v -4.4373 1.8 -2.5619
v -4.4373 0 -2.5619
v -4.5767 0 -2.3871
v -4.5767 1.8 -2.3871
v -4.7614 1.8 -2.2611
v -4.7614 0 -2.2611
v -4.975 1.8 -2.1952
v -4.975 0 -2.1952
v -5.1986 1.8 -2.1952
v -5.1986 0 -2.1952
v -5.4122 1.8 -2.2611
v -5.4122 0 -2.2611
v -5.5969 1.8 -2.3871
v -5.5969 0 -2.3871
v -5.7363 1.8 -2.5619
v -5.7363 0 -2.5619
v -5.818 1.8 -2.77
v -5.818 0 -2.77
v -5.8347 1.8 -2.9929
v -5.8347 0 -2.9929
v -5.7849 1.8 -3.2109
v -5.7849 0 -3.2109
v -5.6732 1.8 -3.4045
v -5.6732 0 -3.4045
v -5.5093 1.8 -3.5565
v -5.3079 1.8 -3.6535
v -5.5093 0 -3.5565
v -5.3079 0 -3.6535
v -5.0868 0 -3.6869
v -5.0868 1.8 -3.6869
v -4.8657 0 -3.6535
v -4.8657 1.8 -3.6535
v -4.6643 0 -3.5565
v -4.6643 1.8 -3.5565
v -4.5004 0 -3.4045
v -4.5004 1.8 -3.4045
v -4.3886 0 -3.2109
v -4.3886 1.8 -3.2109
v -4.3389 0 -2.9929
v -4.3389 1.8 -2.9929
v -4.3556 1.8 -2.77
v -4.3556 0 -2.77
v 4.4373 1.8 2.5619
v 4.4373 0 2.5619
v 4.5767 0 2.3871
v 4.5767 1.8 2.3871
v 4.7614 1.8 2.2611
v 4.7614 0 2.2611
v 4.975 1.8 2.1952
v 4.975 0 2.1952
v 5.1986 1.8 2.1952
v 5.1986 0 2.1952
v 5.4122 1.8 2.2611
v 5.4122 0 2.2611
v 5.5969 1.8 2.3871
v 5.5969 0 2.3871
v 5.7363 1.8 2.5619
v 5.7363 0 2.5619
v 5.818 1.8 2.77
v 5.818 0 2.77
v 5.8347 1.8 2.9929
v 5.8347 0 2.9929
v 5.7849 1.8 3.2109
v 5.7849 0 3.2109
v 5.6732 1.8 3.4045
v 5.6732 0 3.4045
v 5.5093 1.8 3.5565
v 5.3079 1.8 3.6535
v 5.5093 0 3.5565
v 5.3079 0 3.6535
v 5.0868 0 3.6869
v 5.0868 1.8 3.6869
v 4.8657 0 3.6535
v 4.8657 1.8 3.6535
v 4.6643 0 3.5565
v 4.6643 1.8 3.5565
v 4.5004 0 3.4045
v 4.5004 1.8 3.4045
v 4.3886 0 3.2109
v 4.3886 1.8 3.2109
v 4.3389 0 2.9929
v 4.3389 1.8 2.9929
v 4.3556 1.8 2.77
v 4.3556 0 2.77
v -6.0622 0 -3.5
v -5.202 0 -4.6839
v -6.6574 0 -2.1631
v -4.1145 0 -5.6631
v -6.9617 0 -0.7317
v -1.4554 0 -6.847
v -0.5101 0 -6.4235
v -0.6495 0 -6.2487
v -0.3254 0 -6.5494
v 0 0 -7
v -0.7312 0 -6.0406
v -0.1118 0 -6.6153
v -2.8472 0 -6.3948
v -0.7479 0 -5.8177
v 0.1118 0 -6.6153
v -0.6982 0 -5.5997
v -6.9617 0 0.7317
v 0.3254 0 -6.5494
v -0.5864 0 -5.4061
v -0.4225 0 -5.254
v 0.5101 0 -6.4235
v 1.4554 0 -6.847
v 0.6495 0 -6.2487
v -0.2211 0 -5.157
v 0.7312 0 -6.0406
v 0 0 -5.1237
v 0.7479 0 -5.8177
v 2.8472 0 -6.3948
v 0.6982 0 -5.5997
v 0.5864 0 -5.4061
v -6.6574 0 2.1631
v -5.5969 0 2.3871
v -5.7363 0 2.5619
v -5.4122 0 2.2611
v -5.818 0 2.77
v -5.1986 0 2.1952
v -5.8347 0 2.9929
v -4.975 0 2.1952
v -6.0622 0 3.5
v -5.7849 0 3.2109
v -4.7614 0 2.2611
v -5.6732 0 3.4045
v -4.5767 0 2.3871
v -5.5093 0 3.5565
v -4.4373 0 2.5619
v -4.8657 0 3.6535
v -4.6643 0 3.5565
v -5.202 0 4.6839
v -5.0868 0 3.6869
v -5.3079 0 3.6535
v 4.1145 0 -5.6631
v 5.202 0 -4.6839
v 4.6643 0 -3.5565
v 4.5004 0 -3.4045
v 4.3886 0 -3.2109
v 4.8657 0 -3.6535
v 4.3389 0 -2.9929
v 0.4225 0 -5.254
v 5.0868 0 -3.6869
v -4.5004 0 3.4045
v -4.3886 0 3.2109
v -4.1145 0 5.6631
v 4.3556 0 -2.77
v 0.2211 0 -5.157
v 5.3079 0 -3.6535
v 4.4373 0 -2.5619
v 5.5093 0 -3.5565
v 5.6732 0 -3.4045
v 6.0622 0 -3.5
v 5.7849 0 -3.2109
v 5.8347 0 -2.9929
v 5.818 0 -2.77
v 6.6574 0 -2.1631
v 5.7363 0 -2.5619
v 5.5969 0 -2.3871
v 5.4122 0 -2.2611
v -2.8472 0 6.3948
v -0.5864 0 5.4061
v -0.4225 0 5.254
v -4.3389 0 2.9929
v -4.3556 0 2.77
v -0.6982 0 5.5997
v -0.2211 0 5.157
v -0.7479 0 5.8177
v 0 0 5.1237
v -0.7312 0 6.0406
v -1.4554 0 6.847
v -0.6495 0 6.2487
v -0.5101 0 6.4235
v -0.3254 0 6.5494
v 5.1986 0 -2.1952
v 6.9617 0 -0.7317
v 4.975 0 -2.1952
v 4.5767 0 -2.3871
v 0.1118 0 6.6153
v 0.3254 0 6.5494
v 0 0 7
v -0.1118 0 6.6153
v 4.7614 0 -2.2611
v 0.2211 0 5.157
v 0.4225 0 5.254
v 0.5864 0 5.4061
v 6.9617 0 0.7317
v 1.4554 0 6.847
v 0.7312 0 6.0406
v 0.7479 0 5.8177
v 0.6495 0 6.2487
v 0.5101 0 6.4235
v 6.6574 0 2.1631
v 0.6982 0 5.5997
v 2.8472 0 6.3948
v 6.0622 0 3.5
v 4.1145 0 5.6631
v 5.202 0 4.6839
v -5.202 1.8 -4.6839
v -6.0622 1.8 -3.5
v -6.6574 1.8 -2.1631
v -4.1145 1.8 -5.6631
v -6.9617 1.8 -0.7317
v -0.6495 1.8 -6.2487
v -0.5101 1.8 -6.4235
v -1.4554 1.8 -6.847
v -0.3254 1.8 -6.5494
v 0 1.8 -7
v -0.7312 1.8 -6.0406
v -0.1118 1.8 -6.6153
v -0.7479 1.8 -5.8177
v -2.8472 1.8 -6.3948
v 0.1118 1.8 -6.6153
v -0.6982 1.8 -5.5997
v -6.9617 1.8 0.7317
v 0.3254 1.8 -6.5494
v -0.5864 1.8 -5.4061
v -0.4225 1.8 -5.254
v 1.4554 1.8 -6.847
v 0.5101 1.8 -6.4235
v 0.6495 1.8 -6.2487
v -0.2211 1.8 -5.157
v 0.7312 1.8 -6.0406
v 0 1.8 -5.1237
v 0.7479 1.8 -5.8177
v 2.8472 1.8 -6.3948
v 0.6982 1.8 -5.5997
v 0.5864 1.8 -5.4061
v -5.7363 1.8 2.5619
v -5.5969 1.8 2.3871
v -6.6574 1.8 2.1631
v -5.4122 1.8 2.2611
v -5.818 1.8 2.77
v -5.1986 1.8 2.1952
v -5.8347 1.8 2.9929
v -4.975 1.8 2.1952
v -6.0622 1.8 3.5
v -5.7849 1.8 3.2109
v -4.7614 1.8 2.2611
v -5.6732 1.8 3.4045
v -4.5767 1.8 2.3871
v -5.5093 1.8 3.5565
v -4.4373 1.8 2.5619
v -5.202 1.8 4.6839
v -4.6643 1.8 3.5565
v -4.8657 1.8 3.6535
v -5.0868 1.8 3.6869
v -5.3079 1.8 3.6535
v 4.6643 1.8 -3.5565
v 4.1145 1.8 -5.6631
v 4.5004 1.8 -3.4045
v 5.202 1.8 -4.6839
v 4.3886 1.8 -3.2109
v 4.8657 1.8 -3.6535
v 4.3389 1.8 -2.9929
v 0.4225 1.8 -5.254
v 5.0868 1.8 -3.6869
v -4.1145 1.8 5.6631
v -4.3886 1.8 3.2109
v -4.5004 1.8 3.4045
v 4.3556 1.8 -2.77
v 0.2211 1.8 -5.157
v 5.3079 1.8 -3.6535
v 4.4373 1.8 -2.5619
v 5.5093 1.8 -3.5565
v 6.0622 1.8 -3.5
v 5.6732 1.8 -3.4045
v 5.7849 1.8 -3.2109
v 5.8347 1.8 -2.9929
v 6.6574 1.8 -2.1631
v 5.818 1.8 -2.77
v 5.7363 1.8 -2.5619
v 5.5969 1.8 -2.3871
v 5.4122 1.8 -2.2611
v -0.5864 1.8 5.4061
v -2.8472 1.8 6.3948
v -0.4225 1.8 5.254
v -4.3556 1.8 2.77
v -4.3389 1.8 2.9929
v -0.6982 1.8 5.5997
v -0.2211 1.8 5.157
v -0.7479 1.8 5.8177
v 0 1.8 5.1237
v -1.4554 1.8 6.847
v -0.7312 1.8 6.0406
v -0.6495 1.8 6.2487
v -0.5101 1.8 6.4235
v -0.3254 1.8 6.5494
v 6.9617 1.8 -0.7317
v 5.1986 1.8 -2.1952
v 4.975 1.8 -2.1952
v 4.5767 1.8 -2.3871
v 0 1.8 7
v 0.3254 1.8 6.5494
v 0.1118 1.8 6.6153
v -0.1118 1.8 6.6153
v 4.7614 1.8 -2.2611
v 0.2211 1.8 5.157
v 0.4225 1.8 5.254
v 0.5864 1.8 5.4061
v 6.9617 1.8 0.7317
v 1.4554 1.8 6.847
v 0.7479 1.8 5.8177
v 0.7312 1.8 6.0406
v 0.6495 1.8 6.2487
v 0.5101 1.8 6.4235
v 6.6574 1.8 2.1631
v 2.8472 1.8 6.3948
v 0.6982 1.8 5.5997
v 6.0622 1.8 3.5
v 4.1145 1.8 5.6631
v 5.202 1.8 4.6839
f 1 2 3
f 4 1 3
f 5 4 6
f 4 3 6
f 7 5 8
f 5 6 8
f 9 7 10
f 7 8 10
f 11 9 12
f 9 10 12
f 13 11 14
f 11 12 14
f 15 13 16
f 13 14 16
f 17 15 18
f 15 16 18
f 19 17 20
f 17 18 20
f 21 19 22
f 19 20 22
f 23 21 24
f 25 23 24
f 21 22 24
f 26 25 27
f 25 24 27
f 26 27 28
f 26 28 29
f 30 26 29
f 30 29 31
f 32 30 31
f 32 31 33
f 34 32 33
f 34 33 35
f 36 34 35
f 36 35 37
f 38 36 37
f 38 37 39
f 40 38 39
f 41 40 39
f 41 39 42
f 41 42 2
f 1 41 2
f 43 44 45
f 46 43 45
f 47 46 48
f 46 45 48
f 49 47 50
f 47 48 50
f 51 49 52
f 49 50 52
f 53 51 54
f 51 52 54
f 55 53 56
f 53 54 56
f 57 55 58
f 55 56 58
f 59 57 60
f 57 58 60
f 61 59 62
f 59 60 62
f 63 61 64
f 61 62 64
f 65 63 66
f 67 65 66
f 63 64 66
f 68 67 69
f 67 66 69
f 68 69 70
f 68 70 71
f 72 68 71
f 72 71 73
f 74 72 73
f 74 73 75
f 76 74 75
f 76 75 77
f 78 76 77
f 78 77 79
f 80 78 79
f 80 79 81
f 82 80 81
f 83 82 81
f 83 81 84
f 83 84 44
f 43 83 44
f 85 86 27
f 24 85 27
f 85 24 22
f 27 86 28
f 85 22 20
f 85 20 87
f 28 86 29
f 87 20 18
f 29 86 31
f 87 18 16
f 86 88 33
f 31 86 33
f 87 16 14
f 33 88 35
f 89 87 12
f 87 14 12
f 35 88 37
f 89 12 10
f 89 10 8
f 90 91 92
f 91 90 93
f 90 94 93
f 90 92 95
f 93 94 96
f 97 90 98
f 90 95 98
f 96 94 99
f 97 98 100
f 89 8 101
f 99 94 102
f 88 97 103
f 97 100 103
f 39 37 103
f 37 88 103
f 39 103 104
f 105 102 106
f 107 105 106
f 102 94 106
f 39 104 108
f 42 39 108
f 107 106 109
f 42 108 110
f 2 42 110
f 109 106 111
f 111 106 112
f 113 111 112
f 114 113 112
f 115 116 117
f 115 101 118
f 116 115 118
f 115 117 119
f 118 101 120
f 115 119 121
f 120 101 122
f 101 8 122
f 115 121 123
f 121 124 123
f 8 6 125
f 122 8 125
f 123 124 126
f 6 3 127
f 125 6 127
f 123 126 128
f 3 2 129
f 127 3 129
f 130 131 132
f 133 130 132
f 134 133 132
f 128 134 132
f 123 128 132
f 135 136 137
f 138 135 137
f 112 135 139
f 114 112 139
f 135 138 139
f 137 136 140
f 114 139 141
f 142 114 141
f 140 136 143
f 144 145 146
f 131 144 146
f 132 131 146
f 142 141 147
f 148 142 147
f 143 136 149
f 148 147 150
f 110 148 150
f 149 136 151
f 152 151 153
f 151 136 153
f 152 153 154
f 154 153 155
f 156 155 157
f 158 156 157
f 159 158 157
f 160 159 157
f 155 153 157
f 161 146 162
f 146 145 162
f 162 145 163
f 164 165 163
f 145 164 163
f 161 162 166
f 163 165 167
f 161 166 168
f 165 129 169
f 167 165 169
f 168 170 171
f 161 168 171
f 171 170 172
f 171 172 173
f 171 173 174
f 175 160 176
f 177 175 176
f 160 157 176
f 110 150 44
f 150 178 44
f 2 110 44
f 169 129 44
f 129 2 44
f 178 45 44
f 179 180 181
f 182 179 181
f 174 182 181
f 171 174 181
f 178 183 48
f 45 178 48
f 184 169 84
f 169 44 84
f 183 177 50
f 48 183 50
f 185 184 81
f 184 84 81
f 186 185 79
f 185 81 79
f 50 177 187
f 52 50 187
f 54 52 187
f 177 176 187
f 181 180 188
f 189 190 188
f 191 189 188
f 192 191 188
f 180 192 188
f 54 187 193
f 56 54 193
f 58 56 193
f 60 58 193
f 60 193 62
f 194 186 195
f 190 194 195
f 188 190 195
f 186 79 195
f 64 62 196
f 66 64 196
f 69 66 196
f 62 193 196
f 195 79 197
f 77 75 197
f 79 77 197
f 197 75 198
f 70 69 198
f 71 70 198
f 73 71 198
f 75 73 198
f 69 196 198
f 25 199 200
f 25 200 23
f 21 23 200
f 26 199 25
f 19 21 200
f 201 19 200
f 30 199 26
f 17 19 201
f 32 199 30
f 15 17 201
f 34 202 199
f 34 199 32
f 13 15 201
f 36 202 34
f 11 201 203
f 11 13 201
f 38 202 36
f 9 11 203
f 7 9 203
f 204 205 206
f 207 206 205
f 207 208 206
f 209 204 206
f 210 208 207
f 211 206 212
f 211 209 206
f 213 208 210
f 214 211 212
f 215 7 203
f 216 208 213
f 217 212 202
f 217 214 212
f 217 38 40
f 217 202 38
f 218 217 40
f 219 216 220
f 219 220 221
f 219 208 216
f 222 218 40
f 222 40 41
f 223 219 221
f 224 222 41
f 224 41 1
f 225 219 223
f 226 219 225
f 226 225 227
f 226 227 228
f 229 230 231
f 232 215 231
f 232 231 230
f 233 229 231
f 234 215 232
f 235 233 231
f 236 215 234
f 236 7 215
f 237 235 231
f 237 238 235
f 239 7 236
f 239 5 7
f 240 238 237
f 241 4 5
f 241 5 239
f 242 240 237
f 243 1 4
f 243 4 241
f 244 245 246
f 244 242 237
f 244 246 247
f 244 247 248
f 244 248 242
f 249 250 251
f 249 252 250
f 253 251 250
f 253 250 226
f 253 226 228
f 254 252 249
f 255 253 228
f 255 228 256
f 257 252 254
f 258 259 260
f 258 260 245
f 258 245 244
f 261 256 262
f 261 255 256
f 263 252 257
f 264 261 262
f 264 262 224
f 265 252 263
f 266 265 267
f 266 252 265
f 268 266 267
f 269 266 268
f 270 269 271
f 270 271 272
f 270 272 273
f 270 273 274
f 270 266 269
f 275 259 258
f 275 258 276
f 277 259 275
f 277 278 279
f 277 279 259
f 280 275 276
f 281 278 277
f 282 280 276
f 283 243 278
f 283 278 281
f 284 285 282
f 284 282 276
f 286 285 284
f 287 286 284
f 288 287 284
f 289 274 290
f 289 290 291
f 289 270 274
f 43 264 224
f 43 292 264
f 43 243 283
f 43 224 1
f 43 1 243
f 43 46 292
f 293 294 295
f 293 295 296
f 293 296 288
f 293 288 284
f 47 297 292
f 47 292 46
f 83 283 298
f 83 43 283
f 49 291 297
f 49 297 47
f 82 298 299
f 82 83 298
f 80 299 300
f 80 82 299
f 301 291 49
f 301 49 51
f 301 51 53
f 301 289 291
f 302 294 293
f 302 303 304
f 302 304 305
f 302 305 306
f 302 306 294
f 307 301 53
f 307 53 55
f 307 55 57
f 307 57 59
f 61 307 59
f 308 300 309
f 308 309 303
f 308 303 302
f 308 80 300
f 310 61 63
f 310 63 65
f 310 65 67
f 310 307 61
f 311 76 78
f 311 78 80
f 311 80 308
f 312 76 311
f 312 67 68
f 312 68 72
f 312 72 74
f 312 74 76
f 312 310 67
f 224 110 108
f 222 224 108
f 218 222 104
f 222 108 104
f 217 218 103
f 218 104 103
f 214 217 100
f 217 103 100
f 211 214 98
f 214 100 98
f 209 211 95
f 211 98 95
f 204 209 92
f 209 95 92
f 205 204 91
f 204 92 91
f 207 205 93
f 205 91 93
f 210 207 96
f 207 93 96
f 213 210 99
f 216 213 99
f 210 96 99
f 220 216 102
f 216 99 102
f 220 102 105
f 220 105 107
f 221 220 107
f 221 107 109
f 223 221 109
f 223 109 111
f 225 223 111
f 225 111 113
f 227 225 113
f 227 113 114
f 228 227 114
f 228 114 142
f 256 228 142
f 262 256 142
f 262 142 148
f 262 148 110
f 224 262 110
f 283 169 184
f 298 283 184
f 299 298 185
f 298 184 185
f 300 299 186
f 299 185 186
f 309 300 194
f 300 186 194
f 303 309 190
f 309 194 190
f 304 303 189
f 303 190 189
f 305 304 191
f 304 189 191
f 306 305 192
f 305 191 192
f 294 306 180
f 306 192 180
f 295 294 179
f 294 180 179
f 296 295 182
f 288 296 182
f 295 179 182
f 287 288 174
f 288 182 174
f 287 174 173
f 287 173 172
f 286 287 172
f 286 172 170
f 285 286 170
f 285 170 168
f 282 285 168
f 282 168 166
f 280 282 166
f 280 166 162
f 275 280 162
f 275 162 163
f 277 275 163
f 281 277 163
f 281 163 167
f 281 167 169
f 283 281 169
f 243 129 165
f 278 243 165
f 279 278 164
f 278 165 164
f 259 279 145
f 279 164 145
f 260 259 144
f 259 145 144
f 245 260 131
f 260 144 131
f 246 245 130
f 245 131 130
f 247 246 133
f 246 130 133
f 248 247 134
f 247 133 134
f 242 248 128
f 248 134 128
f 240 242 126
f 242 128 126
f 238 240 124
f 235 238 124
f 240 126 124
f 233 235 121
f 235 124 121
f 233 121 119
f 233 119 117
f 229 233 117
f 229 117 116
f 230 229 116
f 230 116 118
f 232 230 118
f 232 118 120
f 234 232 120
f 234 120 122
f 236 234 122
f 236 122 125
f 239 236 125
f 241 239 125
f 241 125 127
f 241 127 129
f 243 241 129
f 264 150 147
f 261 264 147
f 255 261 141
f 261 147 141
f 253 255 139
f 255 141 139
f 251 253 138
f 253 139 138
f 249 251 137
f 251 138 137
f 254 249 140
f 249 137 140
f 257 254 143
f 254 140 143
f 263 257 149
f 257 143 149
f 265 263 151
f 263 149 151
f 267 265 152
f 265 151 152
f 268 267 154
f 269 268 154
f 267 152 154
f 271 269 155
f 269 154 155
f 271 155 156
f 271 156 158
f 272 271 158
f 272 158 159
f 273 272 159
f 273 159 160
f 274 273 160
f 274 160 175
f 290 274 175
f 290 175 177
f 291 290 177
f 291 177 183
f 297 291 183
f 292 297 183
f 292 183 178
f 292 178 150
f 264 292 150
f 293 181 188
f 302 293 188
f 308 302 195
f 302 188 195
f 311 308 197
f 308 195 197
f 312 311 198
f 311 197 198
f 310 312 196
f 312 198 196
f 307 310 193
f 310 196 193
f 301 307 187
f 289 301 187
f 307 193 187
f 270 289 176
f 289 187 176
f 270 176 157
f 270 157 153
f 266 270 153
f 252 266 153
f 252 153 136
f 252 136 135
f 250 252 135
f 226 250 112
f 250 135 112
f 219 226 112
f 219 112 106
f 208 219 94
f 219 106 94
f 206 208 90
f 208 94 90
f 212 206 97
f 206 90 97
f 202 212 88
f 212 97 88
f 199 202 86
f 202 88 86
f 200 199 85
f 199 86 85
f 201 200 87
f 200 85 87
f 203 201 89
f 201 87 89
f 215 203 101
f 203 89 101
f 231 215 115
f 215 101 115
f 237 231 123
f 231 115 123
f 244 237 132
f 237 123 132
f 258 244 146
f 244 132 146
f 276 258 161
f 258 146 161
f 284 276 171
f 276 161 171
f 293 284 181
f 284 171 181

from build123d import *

# Parameters (mm, degrees)
SKETCH1_R           = 7
BOSS_EXTRUDE1_DEPTH = 1.8
SKETCH2_R           = 0.75
CUT_EXTRUDE1_DEPTH  = 11.061808982
CIRPATTERN1_COUNT   = 6


with BuildPart() as part:
    # Sketch1 → Boss-Extrude1 (new body)
    with BuildSketch(Plane(origin=(0, 0, 0), x_dir=(1, 0, 0), z_dir=(0, 1, 0))):
        with Locations(Location((0, 0, 0), (0, 0, 270))):
            Circle(SKETCH1_R)
    extrude(amount=BOSS_EXTRUDE1_DEPTH)

    # Sketch2 → Cut-Extrude1 (cut, through all)
    with BuildSketch(Plane.XZ):
        with Locations(Location((0, 5.873718021, 0), (0, 0, 270))):
            Circle(SKETCH2_R)
    cut_extrude1 = extrude(amount=-CUT_EXTRUDE1_DEPTH, mode=Mode.SUBTRACT)

    # CirPattern1: Cut-Extrude1 ×6 about axis
    cirpattern1_axis = Axis((0, 0, 0), (0, 1, 0))
    for i in range(1, CIRPATTERN1_COUNT):
        add(cut_extrude1.rotate(cirpattern1_axis, i * 360 / CIRPATTERN1_COUNT), mode=Mode.SUBTRACT)


solid = part.part
